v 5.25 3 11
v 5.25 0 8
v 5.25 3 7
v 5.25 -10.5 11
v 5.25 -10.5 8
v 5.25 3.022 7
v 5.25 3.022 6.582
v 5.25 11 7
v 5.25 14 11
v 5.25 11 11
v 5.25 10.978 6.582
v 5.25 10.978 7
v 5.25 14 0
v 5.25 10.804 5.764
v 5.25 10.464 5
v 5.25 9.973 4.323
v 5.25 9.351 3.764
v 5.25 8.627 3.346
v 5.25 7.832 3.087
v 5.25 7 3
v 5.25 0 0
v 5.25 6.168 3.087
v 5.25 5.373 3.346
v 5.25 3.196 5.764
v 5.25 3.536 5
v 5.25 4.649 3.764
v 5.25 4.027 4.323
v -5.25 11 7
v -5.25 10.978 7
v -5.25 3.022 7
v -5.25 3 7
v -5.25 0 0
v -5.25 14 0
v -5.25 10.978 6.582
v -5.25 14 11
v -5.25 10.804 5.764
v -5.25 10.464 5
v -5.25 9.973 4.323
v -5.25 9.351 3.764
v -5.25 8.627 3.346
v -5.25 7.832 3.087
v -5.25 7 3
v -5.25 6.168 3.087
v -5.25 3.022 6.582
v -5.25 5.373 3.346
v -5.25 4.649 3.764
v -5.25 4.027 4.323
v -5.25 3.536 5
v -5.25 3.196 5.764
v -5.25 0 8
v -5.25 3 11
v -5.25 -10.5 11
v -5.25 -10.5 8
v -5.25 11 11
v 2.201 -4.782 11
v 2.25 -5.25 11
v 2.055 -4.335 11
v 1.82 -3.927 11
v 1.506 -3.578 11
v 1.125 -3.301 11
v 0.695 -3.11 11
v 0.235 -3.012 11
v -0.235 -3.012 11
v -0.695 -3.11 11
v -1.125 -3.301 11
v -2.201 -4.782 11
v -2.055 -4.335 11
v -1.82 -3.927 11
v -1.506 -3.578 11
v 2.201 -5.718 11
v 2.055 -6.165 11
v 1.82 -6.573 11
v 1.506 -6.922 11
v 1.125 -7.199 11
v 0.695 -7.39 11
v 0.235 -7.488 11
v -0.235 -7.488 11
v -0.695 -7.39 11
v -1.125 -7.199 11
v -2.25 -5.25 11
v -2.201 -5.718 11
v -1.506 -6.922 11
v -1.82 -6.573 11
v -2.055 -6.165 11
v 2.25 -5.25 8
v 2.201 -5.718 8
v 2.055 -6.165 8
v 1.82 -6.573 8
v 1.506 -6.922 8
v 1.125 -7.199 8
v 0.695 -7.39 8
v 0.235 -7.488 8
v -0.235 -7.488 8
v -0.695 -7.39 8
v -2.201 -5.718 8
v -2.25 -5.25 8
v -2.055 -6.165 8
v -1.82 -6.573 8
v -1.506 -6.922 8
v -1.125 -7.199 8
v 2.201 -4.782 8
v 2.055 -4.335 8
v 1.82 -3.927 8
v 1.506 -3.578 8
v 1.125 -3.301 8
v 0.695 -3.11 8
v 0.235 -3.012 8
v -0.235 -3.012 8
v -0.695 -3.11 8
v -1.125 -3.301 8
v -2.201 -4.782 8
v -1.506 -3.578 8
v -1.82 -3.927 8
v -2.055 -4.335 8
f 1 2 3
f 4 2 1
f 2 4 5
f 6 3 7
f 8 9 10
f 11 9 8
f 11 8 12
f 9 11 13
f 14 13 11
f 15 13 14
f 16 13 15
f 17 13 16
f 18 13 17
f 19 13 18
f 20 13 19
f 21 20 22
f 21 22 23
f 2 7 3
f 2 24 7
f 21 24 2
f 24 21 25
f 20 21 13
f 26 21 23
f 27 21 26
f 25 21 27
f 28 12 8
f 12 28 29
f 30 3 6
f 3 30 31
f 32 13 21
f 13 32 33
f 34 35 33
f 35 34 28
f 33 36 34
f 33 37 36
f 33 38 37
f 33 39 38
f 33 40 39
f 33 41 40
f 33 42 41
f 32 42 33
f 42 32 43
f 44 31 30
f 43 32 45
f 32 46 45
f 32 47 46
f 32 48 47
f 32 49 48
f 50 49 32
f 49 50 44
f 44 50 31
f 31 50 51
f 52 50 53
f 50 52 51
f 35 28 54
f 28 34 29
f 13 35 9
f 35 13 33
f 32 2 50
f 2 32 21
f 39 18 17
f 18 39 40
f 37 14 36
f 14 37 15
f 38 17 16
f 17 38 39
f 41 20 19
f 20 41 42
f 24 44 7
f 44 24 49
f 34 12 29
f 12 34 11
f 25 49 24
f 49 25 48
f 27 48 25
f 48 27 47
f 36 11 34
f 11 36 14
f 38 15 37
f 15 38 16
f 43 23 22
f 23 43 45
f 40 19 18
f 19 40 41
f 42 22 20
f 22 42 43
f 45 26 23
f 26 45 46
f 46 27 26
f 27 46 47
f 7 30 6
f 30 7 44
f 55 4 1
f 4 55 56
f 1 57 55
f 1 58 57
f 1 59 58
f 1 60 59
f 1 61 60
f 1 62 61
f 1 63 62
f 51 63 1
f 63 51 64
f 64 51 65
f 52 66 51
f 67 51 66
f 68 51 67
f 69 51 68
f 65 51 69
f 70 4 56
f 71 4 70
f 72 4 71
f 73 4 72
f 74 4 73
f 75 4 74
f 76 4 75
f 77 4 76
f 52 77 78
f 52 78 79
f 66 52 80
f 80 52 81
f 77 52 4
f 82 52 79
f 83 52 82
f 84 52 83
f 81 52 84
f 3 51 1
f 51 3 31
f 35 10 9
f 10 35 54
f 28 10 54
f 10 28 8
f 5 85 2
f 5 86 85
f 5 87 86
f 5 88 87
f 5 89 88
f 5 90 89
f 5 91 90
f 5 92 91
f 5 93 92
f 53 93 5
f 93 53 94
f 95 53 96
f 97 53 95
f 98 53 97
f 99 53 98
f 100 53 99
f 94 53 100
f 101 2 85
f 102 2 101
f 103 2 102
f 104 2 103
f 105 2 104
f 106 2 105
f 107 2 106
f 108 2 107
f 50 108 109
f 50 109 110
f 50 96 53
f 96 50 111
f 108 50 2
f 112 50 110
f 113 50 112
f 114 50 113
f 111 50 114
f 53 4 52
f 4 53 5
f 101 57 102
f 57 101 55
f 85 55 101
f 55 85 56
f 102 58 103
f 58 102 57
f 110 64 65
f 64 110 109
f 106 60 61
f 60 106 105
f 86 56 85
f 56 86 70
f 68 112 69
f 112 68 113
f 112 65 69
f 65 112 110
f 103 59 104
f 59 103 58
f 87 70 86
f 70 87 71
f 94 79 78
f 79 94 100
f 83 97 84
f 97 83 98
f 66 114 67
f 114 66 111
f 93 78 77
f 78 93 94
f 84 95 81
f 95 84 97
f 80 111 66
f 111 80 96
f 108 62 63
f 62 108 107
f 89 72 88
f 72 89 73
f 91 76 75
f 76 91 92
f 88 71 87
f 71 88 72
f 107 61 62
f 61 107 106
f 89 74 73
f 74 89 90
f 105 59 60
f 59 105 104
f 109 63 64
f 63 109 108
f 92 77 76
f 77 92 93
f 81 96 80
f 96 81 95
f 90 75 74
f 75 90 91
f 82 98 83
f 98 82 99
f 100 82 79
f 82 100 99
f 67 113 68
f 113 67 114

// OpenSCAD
$fn = 30;

cable = 8;
thickness = 3;
cut = 3;
screw = 4.5;

center = (cable + thickness * 2) / 2;
screw_hole = screw + thickness * 2;

translate([-screw_hole / 2, 0, 0])
union() {
    difference() {
        cube([screw_hole,cable + thickness * 2,center]);
        
        translate([- cut / 2, center, center]) rotate([0, 90, 0]) cylinder(screw_hole + cut, cable / 2, cable / 2);
    }

    cube([screw_hole, thickness, cable + thickness]);
    translate([0,cable + thickness,0]) cube([screw_hole, thickness, cable + thickness]);
}


translate([0,0,cable ])
difference() {
    translate([-screw_hole/2, -screw_hole, 0]) cube([screw + thickness * 2, screw + thickness * 2, thickness]);

    translate([0,-screw_hole/2, -cut / 2]) cylinder(thickness + cut, screw / 2, screw / 2);
}

    
